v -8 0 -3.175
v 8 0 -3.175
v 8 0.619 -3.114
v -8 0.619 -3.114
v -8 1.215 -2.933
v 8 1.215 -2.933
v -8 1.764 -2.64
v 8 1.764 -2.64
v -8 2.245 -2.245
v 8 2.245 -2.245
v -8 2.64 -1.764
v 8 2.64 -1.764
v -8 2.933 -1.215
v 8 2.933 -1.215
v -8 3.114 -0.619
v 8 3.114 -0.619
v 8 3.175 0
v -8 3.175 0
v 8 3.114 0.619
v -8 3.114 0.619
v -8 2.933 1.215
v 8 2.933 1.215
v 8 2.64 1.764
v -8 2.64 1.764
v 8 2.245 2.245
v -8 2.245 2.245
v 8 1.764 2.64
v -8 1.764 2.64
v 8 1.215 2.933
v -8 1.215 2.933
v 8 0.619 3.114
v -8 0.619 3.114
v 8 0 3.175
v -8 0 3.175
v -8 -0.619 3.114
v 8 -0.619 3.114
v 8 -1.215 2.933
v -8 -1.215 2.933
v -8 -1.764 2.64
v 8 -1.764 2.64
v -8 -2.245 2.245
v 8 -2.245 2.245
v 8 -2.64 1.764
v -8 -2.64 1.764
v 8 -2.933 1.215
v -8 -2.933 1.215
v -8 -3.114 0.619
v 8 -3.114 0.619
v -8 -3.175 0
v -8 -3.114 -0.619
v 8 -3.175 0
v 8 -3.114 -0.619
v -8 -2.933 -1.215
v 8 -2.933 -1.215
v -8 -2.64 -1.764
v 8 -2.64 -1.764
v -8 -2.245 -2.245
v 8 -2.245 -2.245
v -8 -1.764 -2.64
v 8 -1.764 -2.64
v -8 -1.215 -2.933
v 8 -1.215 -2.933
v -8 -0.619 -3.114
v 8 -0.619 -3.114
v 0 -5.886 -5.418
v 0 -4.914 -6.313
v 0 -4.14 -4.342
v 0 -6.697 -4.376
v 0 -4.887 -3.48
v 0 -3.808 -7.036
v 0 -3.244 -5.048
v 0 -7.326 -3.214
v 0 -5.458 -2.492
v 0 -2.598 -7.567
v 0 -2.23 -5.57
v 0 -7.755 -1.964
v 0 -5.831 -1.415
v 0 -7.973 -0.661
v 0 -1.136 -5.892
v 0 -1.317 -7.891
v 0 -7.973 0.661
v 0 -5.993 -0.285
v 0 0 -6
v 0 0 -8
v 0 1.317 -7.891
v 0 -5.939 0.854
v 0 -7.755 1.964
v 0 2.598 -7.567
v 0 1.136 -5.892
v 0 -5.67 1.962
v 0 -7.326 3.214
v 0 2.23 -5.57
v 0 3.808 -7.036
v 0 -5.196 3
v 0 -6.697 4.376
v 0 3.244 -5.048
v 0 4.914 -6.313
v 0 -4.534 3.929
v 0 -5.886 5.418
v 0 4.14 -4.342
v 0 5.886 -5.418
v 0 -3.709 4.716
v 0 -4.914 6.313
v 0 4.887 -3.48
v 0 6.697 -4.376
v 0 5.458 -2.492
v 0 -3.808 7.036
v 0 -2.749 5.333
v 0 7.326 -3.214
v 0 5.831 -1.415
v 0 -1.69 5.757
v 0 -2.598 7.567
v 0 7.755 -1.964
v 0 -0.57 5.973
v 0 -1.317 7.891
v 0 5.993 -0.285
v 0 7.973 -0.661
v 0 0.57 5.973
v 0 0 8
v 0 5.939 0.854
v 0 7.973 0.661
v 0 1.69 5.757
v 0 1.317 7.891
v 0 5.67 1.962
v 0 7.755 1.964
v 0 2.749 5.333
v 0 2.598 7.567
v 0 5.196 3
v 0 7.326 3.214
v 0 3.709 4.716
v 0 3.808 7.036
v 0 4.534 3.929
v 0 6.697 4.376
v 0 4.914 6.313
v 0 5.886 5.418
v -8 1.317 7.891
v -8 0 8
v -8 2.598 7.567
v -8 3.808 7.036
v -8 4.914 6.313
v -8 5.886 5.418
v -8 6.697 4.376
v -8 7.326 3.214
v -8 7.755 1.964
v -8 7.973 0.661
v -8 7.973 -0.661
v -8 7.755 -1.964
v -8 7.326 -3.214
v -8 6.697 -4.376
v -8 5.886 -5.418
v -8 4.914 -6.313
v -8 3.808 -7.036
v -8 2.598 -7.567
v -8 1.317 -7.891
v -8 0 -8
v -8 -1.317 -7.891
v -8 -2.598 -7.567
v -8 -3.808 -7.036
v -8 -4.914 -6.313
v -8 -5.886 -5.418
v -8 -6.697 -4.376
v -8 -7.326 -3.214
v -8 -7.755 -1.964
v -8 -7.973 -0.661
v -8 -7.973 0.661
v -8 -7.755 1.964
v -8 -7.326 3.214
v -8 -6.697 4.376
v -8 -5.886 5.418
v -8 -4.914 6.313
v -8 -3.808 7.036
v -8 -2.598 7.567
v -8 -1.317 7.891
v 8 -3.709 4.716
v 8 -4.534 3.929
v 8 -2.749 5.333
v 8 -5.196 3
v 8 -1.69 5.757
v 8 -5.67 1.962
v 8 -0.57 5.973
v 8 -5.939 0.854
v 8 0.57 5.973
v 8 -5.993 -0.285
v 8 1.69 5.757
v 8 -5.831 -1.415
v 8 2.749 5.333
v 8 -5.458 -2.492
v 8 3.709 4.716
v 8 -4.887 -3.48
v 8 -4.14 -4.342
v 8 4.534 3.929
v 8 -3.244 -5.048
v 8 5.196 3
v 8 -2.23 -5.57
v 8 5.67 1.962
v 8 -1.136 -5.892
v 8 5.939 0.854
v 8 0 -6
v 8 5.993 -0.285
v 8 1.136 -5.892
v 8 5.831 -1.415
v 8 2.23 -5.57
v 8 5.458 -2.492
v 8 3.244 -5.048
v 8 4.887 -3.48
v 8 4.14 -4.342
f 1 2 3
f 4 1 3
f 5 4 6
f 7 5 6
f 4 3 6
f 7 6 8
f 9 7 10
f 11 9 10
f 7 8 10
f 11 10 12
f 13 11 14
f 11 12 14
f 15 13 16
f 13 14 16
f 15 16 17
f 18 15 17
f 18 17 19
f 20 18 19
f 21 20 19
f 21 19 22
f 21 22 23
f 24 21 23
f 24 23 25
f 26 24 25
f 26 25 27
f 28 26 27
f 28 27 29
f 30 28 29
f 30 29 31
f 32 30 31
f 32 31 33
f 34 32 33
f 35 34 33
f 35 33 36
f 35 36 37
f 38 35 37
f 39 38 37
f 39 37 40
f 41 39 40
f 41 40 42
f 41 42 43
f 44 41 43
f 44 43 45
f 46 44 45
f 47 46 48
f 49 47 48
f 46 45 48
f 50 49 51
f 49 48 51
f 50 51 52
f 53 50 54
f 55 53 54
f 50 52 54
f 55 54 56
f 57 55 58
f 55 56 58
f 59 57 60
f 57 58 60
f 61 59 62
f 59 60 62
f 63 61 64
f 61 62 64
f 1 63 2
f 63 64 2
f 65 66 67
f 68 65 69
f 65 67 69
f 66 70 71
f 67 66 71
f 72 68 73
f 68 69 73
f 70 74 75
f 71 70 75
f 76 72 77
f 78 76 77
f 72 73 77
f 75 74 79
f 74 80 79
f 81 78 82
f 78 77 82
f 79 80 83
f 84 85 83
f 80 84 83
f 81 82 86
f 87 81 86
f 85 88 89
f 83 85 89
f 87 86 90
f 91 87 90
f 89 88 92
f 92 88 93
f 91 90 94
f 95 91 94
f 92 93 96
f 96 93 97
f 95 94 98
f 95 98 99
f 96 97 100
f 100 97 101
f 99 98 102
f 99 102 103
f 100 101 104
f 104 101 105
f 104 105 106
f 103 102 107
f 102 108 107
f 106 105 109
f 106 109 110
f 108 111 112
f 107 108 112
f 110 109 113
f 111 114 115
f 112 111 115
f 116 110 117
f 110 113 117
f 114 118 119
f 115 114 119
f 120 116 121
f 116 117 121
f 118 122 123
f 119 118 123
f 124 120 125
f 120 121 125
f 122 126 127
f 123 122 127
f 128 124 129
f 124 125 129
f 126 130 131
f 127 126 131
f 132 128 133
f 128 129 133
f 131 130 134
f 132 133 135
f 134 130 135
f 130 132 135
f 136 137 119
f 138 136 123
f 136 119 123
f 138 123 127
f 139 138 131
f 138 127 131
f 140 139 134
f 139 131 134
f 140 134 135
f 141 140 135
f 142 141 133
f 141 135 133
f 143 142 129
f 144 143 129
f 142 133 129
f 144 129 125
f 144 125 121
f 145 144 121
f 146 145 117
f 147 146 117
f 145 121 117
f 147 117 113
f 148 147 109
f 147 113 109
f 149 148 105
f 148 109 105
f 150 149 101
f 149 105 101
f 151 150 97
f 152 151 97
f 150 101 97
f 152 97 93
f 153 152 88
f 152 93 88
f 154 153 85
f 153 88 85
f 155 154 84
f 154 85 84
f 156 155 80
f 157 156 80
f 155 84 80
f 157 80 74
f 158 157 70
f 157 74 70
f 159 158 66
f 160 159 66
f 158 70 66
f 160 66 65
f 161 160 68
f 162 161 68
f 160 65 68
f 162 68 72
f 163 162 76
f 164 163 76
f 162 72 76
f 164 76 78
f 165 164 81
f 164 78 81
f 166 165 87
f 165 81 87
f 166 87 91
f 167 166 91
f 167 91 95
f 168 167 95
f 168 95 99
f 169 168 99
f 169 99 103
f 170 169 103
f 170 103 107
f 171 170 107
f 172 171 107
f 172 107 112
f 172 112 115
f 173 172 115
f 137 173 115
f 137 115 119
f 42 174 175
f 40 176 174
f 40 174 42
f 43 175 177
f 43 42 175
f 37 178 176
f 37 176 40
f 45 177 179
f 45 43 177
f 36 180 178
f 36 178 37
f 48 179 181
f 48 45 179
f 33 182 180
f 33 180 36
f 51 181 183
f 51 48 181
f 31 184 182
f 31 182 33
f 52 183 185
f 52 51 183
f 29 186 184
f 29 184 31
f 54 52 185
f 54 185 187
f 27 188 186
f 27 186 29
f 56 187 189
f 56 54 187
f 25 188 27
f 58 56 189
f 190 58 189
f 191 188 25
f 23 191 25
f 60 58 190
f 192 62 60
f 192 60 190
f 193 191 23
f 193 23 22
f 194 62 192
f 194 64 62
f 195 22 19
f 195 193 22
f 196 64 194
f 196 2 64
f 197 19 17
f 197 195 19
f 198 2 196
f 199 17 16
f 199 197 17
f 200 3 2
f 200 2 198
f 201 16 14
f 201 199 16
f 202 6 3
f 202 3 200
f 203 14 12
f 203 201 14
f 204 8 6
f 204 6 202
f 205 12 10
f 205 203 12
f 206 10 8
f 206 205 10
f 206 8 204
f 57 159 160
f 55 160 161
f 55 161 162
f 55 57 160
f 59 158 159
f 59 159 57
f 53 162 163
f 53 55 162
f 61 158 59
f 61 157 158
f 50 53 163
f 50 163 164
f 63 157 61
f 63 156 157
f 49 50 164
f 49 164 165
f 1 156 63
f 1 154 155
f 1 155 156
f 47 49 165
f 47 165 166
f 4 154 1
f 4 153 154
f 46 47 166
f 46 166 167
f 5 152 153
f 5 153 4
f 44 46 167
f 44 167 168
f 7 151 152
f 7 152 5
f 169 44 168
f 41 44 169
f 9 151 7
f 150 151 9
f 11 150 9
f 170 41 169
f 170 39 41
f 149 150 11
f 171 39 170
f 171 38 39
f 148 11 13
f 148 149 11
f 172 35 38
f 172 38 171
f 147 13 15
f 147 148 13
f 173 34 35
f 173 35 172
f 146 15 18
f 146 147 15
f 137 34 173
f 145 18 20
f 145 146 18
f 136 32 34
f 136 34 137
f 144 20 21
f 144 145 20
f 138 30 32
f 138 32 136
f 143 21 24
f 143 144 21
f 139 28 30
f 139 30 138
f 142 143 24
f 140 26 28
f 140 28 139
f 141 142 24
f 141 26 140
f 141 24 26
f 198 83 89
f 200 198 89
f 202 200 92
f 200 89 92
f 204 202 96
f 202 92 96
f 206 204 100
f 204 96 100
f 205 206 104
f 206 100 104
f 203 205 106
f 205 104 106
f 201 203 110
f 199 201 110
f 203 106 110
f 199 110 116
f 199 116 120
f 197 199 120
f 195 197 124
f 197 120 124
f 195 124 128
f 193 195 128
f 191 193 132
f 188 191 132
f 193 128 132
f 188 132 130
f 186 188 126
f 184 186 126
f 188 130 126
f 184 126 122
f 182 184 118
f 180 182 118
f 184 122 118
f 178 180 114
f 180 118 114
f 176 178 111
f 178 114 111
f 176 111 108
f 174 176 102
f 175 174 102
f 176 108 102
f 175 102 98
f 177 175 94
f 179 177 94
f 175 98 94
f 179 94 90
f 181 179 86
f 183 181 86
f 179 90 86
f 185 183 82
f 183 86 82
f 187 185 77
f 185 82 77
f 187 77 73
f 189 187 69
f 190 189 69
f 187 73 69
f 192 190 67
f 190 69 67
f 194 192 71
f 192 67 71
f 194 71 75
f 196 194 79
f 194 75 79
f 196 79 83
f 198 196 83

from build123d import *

# Parameters (mm, degrees)
SKETCH2_R           = 5.999999938
BOSS_EXTRUDE1_DEPTH = 8.000000002
SKETCH3_R           = 8.000000002
BOSS_EXTRUDE2_DEPTH = 8.000000002
SKETCH4_R           = 3.175
CUT_EXTRUDE1_DEPTH  = 17.000000004


with BuildPart() as part:
    # Sketch2 → Boss-Extrude1 (new body)
    with BuildSketch(Plane(origin=(0, 0, 0), x_dir=(0, 0, -1), z_dir=(1, 0, 0))):
        Circle(SKETCH2_R)
    extrude(amount=BOSS_EXTRUDE1_DEPTH)

    # Sketch3 → Boss-Extrude2 (add)
    with BuildSketch(Plane.ZY):
        Circle(SKETCH3_R)
    extrude(amount=BOSS_EXTRUDE2_DEPTH)

    # Sketch4 → Cut-Extrude1 (cut, through all)
    with BuildSketch(Plane(origin=(8.000000002, 0, 0), x_dir=(0, 0, -1), z_dir=(1, 0, 0))):
        Circle(SKETCH4_R)
    extrude(amount=-CUT_EXTRUDE1_DEPTH, mode=Mode.SUBTRACT)


solid = part.part
